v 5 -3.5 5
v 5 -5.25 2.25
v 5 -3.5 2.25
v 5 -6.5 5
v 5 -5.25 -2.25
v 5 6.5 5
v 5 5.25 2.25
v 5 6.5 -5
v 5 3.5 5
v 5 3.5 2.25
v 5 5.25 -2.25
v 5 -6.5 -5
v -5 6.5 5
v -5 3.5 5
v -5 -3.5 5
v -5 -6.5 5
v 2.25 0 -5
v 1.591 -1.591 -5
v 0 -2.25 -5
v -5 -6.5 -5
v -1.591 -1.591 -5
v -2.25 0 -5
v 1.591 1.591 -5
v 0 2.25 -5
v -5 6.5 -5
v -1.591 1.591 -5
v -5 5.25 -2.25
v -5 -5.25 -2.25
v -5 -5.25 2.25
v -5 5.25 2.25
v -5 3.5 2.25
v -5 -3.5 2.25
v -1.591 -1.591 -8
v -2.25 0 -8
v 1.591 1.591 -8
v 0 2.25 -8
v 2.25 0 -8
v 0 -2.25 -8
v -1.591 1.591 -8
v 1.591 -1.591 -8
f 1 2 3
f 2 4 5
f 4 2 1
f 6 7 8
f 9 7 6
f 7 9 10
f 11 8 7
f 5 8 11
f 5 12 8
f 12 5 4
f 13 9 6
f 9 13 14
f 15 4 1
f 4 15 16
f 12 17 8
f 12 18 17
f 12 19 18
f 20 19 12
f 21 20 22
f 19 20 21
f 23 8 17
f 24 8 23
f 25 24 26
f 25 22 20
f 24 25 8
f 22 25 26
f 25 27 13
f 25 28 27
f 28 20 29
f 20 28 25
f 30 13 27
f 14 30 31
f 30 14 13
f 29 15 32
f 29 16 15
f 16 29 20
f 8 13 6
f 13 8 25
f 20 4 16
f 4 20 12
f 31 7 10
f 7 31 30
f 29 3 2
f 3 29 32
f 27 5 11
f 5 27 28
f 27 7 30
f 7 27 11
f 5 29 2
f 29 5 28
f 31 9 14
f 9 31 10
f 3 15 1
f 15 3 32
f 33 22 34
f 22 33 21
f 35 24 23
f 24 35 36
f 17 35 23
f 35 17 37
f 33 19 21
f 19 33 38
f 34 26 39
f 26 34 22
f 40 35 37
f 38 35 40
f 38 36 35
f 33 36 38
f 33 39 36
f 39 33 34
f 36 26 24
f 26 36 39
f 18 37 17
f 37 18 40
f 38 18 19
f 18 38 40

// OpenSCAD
module slider() {
	difference() {
		cube([10,13,10],center=true);
		cube([20,10.5,4.5],center=true);
		translate([0,0,5])
		cube([20,7,7],center=true);
	}
	translate([0,0,-6])
	cylinder(r=2.25,h=4,center=true);
}

slider();
